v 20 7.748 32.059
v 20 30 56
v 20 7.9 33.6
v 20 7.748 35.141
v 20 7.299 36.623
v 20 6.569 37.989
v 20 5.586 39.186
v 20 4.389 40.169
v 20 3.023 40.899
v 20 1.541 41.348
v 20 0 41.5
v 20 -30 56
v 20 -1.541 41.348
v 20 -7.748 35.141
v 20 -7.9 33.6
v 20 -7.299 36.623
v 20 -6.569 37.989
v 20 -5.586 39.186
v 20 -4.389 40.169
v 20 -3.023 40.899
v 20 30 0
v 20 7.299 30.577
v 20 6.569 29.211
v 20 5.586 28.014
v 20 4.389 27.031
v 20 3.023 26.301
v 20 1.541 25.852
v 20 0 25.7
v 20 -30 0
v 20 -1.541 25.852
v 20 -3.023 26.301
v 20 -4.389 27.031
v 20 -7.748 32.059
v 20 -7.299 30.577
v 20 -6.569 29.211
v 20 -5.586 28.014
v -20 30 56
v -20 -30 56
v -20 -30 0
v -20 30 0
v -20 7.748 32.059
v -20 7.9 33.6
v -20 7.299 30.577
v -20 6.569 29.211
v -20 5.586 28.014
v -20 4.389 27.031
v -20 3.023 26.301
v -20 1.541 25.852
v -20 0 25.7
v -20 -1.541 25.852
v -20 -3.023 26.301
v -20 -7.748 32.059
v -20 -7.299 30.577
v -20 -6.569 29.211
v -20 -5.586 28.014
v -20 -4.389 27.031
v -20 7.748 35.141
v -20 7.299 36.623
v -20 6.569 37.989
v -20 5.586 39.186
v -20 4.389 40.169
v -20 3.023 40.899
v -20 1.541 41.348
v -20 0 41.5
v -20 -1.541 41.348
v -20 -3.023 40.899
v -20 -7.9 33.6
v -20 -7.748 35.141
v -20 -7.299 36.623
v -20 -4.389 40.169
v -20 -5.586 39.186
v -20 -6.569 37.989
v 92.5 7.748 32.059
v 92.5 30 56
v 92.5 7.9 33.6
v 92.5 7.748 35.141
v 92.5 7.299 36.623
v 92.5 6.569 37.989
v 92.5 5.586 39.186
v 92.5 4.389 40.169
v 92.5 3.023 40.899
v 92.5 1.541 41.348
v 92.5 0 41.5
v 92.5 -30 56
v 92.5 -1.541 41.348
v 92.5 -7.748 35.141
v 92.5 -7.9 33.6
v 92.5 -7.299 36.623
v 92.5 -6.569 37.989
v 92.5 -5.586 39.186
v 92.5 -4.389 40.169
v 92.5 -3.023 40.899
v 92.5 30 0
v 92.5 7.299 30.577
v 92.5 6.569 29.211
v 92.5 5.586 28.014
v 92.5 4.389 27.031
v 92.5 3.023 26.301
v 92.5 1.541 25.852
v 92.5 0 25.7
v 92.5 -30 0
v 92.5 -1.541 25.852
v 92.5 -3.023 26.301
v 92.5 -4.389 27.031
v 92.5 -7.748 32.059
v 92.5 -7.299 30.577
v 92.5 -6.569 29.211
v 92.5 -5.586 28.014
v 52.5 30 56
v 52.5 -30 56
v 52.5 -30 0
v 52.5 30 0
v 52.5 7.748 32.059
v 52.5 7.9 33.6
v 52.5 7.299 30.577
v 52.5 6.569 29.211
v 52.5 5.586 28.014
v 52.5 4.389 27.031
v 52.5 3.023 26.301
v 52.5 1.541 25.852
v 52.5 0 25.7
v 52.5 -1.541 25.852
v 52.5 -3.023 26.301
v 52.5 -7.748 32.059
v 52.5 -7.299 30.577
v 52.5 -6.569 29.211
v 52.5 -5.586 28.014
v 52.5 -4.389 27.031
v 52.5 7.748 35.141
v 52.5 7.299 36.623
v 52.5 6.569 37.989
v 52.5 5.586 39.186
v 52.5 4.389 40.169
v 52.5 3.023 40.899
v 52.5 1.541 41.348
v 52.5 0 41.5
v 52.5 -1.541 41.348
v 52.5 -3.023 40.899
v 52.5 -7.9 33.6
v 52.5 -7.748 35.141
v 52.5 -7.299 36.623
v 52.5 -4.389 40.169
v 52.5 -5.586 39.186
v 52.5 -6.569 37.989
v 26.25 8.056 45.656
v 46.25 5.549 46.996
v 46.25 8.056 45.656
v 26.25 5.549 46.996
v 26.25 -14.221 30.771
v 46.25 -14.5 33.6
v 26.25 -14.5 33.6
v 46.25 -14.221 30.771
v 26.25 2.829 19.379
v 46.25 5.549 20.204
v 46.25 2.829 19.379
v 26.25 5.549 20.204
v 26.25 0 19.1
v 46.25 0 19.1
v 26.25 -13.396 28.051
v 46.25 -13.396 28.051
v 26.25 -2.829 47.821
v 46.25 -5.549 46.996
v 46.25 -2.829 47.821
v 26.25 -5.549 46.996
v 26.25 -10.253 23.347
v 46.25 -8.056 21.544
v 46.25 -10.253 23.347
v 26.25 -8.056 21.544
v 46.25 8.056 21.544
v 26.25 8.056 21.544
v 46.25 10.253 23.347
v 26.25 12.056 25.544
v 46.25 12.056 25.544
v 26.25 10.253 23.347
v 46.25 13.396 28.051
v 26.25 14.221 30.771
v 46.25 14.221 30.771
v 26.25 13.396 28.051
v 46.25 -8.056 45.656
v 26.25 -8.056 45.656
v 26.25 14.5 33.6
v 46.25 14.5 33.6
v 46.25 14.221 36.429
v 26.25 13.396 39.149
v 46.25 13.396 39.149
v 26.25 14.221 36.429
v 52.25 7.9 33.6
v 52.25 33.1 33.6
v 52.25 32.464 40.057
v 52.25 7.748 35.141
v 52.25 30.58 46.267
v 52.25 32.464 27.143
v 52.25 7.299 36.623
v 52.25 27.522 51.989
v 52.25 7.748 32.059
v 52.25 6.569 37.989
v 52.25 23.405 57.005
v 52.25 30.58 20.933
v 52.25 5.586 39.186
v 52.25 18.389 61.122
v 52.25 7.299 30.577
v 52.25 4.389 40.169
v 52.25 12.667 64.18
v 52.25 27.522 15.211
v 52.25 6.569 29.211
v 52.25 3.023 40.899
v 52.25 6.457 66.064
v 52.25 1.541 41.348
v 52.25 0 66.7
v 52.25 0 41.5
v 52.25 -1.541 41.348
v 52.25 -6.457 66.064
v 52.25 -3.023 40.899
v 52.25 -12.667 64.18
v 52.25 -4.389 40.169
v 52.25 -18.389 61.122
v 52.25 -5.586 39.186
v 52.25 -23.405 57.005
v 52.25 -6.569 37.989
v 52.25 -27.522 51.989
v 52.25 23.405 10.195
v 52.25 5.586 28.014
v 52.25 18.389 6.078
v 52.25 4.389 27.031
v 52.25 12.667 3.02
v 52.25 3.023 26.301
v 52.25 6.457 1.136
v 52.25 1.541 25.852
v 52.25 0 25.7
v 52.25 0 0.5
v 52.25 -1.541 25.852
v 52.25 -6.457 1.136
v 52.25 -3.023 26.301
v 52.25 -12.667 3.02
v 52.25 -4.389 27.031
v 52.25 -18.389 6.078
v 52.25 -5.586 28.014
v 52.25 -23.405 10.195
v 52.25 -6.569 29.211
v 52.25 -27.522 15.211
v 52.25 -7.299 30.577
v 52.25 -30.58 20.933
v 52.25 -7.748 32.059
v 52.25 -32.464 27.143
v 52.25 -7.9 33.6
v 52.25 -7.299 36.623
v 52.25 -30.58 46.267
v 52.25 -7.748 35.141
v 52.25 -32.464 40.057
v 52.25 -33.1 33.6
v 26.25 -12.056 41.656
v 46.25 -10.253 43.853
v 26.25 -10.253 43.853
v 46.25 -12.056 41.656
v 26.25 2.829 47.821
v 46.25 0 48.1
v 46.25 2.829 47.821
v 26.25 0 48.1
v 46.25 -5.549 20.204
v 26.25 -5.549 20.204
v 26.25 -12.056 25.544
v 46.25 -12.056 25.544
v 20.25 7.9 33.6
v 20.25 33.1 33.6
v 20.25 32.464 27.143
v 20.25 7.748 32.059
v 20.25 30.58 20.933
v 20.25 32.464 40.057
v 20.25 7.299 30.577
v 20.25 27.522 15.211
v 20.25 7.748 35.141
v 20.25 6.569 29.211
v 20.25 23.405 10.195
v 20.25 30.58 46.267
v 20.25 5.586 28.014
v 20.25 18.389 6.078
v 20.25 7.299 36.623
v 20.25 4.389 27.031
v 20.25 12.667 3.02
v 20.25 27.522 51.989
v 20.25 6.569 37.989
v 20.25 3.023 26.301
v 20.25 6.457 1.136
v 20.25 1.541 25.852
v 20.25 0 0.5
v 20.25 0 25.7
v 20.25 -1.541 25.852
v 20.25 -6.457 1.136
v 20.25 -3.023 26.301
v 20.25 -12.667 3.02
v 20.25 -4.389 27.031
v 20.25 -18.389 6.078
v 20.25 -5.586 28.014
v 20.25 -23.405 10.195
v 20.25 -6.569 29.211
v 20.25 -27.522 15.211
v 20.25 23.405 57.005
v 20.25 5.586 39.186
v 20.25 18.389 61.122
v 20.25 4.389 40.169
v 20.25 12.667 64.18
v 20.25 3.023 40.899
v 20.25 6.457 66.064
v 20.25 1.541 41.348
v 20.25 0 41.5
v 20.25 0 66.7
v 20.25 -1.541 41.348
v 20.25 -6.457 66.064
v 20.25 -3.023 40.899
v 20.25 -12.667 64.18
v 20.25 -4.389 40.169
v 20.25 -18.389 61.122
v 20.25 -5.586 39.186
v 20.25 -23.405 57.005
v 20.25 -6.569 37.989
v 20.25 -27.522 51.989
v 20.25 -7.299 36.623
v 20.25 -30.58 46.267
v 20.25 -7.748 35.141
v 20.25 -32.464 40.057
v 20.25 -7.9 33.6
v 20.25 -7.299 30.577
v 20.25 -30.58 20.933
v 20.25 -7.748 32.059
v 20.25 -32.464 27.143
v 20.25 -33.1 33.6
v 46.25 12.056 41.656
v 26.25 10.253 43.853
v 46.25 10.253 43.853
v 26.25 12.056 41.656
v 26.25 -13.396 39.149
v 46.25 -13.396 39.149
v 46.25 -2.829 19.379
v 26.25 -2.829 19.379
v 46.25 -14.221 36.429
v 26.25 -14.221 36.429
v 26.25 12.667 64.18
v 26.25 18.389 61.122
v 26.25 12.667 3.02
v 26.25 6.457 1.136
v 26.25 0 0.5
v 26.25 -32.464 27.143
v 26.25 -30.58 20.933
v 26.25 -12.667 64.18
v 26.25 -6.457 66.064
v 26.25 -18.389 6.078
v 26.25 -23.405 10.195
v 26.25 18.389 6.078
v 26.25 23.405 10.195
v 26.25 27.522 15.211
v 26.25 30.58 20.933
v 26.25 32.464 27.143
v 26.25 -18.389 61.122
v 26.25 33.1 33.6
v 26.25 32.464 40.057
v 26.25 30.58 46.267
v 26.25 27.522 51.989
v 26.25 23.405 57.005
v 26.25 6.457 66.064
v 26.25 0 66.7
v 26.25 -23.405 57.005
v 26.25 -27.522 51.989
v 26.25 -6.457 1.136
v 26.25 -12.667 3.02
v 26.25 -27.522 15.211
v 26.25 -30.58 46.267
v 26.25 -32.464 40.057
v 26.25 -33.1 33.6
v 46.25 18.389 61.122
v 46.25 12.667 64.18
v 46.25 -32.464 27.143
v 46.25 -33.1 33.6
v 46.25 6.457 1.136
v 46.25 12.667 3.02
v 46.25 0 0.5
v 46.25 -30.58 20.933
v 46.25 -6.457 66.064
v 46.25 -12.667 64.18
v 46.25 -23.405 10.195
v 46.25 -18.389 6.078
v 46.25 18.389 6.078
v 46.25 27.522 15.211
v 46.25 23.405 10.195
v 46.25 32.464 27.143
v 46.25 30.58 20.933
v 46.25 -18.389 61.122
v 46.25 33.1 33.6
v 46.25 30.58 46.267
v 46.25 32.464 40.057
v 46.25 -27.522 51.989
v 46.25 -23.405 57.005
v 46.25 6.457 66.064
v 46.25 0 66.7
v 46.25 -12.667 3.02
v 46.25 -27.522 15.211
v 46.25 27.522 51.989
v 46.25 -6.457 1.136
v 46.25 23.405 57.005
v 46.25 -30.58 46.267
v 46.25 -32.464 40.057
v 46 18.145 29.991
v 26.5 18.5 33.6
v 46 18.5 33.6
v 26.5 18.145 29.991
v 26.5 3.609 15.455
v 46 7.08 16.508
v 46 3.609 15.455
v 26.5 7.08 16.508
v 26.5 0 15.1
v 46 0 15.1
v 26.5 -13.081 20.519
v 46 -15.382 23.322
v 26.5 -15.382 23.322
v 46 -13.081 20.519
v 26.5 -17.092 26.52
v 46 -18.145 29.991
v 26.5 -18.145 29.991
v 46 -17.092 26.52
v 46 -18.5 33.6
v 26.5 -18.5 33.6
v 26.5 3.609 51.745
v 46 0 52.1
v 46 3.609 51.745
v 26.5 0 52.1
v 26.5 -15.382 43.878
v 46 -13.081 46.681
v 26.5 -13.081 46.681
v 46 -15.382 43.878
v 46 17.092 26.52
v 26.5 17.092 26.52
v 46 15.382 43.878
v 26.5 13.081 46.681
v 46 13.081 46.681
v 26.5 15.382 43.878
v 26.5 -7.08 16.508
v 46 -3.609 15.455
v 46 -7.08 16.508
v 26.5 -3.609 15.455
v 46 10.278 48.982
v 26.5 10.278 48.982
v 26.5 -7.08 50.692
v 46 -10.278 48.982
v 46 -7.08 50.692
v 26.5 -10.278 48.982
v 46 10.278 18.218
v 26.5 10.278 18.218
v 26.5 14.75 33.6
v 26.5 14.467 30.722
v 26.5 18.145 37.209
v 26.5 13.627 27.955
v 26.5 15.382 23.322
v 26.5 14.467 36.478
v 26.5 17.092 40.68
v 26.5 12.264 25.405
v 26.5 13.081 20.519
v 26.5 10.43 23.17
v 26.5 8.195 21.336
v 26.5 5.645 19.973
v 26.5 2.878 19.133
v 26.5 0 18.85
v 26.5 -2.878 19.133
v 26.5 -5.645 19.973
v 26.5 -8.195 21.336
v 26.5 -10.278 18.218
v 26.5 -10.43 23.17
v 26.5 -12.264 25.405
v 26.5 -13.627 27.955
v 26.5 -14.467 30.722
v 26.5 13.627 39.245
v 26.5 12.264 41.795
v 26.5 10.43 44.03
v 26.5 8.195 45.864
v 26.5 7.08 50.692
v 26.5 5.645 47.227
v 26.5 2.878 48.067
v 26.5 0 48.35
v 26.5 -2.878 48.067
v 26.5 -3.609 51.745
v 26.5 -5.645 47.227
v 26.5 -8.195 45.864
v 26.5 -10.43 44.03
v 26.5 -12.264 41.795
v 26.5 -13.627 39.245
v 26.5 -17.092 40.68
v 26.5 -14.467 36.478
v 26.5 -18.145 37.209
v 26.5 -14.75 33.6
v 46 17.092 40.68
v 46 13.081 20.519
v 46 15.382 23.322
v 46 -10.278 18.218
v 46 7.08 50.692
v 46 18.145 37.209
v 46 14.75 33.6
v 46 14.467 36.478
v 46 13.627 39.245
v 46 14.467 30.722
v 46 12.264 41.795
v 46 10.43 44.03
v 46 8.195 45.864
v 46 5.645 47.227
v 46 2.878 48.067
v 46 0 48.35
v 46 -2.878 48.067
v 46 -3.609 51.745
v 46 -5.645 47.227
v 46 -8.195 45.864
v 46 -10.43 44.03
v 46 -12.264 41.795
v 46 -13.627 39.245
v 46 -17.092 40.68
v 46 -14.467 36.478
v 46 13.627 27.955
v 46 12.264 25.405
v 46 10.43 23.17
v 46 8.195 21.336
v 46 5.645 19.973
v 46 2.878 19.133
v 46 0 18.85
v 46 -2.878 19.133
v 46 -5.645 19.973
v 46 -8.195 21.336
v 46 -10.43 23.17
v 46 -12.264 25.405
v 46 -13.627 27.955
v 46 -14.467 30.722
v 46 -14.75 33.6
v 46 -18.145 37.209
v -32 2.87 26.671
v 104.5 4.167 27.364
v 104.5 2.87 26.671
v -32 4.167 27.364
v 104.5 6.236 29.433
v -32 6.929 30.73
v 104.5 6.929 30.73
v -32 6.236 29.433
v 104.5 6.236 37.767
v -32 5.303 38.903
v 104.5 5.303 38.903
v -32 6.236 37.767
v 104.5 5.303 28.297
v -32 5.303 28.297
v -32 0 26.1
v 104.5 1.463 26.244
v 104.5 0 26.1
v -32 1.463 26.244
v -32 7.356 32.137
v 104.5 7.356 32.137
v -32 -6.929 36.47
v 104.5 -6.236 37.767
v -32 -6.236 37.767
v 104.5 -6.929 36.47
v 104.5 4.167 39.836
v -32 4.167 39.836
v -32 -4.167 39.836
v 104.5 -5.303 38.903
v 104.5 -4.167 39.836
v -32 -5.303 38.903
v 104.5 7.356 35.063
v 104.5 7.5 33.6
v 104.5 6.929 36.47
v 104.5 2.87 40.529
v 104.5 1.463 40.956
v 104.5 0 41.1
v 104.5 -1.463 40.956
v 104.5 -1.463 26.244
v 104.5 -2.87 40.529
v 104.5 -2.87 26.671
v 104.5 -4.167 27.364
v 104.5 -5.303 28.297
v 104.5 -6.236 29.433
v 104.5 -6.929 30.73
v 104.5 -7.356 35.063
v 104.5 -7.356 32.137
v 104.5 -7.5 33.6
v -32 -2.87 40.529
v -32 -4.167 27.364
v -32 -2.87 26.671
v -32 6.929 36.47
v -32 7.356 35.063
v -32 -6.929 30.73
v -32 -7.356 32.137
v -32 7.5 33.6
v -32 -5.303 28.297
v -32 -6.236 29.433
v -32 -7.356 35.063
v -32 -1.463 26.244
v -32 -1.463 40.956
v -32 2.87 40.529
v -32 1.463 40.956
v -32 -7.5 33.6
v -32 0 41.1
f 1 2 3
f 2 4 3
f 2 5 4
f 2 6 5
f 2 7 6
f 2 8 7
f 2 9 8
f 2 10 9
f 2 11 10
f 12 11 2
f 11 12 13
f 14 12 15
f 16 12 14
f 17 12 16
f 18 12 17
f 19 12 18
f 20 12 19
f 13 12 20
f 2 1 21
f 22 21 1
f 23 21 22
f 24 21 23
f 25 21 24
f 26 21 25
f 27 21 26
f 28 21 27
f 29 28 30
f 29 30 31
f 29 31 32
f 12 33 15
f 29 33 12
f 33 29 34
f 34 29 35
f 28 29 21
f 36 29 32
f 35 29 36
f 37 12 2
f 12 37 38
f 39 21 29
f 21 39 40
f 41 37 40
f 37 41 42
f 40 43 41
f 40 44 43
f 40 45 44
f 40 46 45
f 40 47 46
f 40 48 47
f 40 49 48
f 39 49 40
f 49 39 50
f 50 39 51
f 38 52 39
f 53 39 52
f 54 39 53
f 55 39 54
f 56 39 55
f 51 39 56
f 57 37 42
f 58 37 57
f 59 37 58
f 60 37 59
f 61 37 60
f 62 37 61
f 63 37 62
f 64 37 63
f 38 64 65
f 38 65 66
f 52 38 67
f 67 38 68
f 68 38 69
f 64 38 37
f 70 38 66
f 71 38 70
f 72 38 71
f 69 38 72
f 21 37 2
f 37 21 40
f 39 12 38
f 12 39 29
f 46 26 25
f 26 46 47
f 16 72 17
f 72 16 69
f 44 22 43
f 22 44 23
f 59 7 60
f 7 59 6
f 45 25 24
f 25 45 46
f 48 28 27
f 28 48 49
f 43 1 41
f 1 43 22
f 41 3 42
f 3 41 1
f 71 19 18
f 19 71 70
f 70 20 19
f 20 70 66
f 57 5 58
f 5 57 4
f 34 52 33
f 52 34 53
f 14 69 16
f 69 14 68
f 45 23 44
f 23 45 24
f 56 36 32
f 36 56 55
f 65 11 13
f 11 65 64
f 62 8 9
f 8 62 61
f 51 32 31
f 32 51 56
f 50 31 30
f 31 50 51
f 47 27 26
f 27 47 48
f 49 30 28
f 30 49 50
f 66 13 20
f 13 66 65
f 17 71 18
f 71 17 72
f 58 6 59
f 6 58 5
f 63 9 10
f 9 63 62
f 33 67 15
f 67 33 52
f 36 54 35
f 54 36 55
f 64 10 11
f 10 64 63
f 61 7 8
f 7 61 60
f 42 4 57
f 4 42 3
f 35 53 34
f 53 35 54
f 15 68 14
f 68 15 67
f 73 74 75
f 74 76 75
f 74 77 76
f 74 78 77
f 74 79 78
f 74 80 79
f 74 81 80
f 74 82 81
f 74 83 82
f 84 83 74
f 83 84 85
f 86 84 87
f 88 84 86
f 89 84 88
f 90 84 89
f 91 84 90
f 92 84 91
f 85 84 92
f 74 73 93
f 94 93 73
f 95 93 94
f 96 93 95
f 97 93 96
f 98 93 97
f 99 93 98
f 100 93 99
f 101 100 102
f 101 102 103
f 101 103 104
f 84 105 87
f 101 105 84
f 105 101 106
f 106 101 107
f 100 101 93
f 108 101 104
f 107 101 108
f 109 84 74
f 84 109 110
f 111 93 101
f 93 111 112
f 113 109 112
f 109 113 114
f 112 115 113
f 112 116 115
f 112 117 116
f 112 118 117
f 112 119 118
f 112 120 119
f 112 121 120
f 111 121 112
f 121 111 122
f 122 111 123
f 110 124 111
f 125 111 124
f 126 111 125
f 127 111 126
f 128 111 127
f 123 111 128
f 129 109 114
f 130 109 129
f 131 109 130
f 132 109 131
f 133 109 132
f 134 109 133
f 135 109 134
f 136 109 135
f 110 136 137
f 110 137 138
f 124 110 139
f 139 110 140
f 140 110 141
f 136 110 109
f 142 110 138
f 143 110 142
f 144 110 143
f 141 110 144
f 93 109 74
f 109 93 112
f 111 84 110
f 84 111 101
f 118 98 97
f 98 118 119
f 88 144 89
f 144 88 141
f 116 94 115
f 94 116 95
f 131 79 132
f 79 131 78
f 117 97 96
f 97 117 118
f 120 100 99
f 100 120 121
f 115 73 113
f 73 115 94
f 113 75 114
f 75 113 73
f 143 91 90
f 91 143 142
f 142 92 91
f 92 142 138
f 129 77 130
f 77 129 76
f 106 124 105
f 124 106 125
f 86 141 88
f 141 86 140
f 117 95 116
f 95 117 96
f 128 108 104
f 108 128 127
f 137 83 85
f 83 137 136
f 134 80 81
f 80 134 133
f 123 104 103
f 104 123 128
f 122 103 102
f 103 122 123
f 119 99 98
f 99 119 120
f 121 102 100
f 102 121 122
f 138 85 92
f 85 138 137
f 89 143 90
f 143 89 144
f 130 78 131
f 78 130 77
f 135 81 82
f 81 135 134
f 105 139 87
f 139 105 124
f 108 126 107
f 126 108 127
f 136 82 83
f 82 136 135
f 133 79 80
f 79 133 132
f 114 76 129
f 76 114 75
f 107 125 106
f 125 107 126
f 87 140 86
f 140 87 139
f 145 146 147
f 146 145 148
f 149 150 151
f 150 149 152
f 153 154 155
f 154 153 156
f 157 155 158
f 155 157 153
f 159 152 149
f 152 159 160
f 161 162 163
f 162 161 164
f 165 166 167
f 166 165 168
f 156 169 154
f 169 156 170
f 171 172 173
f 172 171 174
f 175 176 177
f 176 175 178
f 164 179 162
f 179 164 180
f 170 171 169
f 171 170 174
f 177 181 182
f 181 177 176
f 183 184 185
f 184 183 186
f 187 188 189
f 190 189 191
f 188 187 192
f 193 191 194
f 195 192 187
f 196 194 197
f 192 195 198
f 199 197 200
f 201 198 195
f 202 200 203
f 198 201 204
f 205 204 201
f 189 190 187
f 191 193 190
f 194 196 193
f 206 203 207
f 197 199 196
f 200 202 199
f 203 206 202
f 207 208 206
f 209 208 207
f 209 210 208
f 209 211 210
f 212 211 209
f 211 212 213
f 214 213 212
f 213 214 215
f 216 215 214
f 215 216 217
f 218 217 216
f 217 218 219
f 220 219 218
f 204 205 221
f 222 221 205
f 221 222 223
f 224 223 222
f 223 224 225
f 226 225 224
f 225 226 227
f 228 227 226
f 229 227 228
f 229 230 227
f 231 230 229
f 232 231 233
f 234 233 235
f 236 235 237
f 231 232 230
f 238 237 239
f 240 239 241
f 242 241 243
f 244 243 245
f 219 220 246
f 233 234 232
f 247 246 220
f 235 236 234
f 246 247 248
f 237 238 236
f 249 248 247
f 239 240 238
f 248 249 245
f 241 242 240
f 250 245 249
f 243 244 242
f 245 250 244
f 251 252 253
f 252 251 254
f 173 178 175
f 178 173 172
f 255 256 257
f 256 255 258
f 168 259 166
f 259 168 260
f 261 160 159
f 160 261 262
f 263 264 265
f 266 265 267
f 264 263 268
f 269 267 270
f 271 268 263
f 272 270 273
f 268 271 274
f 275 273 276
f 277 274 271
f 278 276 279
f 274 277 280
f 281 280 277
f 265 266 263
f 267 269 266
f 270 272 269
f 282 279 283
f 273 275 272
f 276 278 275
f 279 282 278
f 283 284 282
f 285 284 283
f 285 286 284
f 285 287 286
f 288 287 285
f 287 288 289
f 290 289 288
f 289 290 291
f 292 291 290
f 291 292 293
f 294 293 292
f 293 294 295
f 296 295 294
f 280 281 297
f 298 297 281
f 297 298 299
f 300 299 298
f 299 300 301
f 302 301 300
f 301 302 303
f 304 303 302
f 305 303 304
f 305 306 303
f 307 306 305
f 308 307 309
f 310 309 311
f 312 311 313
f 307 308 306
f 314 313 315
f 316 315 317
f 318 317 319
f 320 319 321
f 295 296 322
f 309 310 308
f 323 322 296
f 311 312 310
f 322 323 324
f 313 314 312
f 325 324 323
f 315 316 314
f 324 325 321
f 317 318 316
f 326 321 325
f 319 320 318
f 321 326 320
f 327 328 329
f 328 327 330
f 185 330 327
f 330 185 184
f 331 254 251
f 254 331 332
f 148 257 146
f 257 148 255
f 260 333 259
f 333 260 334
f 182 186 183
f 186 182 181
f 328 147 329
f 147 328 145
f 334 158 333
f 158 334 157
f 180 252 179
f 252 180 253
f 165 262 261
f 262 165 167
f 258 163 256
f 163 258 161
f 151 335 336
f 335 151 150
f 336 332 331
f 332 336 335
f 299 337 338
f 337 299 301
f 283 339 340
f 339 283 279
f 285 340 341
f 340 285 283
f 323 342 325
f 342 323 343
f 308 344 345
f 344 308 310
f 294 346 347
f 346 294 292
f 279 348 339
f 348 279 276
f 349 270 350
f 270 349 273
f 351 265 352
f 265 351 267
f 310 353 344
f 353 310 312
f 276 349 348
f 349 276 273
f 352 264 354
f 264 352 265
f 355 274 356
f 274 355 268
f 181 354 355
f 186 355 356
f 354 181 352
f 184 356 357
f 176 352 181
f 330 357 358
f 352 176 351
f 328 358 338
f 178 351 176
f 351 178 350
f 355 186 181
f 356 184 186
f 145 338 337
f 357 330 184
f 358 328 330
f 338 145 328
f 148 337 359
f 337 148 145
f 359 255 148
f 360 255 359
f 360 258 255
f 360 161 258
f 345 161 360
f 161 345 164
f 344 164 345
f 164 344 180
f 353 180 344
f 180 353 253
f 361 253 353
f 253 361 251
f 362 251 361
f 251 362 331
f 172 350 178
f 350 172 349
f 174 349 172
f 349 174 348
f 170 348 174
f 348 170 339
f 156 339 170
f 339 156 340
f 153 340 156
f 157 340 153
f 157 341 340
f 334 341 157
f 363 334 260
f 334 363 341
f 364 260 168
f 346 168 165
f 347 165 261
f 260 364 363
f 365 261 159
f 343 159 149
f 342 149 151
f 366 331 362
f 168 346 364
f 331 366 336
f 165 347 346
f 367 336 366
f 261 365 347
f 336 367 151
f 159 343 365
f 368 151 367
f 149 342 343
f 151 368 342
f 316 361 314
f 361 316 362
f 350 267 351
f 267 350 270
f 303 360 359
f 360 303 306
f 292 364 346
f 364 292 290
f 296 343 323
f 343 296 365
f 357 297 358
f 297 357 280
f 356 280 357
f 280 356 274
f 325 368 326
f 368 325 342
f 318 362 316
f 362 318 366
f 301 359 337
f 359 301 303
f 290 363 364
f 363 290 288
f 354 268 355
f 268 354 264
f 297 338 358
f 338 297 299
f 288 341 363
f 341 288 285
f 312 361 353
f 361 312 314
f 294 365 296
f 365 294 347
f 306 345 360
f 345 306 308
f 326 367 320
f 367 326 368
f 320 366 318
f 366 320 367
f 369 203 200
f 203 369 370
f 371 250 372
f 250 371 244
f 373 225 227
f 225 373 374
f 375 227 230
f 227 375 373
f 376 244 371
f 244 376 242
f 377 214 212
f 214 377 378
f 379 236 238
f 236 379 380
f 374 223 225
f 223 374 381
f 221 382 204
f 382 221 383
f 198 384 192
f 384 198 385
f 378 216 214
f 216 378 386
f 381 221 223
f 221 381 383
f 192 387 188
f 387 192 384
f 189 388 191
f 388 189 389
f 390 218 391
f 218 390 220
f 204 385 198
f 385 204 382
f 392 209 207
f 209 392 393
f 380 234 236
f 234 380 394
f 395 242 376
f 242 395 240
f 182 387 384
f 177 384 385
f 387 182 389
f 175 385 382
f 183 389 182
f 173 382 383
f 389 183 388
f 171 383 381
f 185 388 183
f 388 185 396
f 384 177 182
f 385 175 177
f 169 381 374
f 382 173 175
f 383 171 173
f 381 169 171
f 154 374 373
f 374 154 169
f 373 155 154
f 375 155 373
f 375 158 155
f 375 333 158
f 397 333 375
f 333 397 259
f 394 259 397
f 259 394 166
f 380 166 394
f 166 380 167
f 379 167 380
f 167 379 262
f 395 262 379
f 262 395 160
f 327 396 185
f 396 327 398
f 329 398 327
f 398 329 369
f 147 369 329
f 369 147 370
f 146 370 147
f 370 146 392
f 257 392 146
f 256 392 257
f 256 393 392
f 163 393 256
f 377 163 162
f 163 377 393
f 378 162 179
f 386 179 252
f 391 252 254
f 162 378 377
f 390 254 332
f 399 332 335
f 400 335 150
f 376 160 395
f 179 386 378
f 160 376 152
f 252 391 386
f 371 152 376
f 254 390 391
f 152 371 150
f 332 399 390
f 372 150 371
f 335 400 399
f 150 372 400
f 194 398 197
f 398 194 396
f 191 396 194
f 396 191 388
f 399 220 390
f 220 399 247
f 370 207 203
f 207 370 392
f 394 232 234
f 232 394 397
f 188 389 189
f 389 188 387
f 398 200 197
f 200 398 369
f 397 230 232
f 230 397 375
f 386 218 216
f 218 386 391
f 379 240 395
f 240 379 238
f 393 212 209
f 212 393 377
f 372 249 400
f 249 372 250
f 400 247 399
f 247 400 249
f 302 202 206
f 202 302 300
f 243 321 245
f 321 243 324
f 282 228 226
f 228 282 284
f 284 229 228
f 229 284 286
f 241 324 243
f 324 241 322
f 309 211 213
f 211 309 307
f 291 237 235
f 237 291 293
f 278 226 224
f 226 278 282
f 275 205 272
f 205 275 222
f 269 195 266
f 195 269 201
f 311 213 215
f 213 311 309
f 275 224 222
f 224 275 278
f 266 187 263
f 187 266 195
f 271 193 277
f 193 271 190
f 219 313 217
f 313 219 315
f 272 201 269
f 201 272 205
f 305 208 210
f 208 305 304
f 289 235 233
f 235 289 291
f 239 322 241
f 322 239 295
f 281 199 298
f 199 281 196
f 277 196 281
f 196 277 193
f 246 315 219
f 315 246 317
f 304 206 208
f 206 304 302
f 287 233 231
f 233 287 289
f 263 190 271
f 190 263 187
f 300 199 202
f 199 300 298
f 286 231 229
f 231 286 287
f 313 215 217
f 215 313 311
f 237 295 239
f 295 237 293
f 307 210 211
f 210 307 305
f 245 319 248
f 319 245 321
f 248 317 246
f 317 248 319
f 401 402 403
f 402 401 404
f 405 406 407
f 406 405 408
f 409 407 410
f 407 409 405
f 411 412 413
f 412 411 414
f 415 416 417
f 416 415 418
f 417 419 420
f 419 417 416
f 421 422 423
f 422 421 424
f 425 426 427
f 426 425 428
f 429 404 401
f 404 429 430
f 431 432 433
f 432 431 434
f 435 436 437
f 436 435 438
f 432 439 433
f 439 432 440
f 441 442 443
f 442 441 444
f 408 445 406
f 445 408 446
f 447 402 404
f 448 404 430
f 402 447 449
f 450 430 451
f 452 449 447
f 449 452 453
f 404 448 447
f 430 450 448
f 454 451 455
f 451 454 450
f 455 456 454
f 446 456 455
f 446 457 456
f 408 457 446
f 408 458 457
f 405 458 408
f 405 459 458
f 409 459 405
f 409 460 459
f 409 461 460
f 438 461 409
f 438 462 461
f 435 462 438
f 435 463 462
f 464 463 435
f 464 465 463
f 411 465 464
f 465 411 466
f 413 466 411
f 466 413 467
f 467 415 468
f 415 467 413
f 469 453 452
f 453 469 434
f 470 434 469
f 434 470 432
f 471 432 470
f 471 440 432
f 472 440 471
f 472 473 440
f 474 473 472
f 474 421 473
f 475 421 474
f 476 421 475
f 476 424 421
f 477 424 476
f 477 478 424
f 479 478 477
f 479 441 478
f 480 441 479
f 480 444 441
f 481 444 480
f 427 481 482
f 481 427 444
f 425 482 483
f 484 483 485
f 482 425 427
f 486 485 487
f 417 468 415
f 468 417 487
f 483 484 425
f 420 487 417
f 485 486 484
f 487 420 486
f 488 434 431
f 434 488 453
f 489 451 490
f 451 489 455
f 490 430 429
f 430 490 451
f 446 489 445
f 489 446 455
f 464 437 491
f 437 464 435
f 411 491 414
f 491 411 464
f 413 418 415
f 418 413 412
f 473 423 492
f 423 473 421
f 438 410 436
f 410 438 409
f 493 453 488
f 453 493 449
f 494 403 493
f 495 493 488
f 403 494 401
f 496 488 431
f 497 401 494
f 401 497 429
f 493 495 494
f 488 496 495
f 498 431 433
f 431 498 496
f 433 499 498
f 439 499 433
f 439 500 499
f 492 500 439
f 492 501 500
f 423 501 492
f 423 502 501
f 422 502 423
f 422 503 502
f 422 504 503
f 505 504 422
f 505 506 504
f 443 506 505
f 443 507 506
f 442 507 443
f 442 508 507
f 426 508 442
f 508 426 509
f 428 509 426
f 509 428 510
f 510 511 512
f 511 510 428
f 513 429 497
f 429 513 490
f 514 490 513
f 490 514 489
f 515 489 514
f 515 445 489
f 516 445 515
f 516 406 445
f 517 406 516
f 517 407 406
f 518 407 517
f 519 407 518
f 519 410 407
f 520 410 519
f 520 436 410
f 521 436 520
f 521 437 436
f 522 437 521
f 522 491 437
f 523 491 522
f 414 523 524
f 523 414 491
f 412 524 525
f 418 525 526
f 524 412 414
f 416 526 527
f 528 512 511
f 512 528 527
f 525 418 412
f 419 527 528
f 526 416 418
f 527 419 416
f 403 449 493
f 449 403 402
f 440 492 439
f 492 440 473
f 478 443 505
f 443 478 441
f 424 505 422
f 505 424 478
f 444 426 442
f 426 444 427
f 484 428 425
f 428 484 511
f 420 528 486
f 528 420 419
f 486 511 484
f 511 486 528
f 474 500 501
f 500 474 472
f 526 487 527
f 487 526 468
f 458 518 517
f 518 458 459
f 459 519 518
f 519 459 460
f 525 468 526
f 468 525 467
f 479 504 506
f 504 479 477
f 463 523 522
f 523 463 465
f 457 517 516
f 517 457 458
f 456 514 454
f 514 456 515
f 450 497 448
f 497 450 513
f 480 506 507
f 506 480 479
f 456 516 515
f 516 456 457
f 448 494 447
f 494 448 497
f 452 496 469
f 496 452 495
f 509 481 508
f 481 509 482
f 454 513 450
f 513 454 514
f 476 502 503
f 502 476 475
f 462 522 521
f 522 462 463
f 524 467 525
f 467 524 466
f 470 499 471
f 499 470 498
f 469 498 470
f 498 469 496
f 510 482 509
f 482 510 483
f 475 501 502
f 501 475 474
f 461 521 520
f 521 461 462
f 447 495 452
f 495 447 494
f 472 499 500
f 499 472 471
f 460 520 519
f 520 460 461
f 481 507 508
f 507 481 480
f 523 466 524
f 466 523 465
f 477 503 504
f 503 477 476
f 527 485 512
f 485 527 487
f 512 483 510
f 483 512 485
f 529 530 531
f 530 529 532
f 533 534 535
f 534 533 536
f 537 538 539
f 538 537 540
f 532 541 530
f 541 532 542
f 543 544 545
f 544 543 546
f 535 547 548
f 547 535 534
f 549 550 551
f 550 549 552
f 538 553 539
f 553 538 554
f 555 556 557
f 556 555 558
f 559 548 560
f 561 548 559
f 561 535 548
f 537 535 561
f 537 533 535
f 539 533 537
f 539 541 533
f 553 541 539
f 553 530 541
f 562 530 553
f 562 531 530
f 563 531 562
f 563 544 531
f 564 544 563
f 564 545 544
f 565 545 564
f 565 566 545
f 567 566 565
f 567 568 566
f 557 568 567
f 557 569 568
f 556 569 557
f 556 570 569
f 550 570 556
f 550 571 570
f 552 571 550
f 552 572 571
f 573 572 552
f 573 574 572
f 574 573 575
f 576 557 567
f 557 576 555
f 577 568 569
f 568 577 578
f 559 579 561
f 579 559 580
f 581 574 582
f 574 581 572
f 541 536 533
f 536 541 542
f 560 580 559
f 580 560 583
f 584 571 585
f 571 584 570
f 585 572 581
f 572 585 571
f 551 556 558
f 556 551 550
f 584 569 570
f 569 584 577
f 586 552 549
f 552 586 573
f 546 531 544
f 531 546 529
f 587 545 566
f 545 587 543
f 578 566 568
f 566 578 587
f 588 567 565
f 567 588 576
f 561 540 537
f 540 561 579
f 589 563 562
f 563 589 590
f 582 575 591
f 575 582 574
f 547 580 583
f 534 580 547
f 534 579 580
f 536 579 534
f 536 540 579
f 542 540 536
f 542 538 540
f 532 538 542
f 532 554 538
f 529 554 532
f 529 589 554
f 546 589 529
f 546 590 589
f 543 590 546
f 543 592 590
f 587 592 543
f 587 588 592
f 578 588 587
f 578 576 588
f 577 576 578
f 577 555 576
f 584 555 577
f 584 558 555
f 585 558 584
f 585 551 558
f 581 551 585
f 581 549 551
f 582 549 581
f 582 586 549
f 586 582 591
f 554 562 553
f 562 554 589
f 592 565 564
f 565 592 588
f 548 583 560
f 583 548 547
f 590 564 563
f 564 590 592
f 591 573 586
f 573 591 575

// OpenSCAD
$fn = 32;

// ------------------------------------------------------------------------
// Pulley assembly: d66.2 pulley with a belt, shaft d15
// Every part is its own module, assembly() places them once.
// ------------------------------------------------------------------------

// --- part 1 ---
module support1() {
  difference() {
    translate([-20, -30, 0]) cube([40, 60, 56]);
    translate([0, 0, 33.6]) rotate([0, 90, 0]) cylinder(h = 42, d = 15.8, center = true);
  }
}

// --- part 2 ---
module support2() {
  difference() {
    translate([-20, -30, 0]) cube([40, 60, 56]);
    translate([0, 0, 33.6]) rotate([0, 90, 0]) cylinder(h = 42, d = 15.8, center = true);
  }
}

// --- part 3 ---
module shaft() {
  translate([0, 0, -68.25]) cylinder(h = 136.5, d = 15);
}

// --- part 4 ---
module pulley() {
  difference() {
    union() {
      cylinder(h = 32, d = 29);
      cylinder(h = 6, d = 66.2);
      translate([0, 0, 26]) cylinder(h = 6, d = 66.2);
    }
    translate([0, 0, -1]) cylinder(h = 34, d = 15.8);
  }
}

// --- part 5 ---
module belt() {
  difference() {
      translate([0, 0, 0]) cylinder(h = 19.5, d = 37);
      translate([0, 0, -1]) cylinder(h = 21.5, d = 29.5);
    }
}

// --- assembly ---
module assembly() {
  translate([0, 0, 0]) rotate([0, 0, 0]) support1();
  translate([72.5, 0, 0]) rotate([0, 0, 0]) support2();
  translate([36.25, 0, 33.6]) rotate([0, 90, 0]) shaft();
  translate([20.25, 0, 33.6]) rotate([0, 90, 0]) pulley();
  translate([26.5, 0, 33.6]) rotate([0, 90, 0]) belt();
}

assembly();
